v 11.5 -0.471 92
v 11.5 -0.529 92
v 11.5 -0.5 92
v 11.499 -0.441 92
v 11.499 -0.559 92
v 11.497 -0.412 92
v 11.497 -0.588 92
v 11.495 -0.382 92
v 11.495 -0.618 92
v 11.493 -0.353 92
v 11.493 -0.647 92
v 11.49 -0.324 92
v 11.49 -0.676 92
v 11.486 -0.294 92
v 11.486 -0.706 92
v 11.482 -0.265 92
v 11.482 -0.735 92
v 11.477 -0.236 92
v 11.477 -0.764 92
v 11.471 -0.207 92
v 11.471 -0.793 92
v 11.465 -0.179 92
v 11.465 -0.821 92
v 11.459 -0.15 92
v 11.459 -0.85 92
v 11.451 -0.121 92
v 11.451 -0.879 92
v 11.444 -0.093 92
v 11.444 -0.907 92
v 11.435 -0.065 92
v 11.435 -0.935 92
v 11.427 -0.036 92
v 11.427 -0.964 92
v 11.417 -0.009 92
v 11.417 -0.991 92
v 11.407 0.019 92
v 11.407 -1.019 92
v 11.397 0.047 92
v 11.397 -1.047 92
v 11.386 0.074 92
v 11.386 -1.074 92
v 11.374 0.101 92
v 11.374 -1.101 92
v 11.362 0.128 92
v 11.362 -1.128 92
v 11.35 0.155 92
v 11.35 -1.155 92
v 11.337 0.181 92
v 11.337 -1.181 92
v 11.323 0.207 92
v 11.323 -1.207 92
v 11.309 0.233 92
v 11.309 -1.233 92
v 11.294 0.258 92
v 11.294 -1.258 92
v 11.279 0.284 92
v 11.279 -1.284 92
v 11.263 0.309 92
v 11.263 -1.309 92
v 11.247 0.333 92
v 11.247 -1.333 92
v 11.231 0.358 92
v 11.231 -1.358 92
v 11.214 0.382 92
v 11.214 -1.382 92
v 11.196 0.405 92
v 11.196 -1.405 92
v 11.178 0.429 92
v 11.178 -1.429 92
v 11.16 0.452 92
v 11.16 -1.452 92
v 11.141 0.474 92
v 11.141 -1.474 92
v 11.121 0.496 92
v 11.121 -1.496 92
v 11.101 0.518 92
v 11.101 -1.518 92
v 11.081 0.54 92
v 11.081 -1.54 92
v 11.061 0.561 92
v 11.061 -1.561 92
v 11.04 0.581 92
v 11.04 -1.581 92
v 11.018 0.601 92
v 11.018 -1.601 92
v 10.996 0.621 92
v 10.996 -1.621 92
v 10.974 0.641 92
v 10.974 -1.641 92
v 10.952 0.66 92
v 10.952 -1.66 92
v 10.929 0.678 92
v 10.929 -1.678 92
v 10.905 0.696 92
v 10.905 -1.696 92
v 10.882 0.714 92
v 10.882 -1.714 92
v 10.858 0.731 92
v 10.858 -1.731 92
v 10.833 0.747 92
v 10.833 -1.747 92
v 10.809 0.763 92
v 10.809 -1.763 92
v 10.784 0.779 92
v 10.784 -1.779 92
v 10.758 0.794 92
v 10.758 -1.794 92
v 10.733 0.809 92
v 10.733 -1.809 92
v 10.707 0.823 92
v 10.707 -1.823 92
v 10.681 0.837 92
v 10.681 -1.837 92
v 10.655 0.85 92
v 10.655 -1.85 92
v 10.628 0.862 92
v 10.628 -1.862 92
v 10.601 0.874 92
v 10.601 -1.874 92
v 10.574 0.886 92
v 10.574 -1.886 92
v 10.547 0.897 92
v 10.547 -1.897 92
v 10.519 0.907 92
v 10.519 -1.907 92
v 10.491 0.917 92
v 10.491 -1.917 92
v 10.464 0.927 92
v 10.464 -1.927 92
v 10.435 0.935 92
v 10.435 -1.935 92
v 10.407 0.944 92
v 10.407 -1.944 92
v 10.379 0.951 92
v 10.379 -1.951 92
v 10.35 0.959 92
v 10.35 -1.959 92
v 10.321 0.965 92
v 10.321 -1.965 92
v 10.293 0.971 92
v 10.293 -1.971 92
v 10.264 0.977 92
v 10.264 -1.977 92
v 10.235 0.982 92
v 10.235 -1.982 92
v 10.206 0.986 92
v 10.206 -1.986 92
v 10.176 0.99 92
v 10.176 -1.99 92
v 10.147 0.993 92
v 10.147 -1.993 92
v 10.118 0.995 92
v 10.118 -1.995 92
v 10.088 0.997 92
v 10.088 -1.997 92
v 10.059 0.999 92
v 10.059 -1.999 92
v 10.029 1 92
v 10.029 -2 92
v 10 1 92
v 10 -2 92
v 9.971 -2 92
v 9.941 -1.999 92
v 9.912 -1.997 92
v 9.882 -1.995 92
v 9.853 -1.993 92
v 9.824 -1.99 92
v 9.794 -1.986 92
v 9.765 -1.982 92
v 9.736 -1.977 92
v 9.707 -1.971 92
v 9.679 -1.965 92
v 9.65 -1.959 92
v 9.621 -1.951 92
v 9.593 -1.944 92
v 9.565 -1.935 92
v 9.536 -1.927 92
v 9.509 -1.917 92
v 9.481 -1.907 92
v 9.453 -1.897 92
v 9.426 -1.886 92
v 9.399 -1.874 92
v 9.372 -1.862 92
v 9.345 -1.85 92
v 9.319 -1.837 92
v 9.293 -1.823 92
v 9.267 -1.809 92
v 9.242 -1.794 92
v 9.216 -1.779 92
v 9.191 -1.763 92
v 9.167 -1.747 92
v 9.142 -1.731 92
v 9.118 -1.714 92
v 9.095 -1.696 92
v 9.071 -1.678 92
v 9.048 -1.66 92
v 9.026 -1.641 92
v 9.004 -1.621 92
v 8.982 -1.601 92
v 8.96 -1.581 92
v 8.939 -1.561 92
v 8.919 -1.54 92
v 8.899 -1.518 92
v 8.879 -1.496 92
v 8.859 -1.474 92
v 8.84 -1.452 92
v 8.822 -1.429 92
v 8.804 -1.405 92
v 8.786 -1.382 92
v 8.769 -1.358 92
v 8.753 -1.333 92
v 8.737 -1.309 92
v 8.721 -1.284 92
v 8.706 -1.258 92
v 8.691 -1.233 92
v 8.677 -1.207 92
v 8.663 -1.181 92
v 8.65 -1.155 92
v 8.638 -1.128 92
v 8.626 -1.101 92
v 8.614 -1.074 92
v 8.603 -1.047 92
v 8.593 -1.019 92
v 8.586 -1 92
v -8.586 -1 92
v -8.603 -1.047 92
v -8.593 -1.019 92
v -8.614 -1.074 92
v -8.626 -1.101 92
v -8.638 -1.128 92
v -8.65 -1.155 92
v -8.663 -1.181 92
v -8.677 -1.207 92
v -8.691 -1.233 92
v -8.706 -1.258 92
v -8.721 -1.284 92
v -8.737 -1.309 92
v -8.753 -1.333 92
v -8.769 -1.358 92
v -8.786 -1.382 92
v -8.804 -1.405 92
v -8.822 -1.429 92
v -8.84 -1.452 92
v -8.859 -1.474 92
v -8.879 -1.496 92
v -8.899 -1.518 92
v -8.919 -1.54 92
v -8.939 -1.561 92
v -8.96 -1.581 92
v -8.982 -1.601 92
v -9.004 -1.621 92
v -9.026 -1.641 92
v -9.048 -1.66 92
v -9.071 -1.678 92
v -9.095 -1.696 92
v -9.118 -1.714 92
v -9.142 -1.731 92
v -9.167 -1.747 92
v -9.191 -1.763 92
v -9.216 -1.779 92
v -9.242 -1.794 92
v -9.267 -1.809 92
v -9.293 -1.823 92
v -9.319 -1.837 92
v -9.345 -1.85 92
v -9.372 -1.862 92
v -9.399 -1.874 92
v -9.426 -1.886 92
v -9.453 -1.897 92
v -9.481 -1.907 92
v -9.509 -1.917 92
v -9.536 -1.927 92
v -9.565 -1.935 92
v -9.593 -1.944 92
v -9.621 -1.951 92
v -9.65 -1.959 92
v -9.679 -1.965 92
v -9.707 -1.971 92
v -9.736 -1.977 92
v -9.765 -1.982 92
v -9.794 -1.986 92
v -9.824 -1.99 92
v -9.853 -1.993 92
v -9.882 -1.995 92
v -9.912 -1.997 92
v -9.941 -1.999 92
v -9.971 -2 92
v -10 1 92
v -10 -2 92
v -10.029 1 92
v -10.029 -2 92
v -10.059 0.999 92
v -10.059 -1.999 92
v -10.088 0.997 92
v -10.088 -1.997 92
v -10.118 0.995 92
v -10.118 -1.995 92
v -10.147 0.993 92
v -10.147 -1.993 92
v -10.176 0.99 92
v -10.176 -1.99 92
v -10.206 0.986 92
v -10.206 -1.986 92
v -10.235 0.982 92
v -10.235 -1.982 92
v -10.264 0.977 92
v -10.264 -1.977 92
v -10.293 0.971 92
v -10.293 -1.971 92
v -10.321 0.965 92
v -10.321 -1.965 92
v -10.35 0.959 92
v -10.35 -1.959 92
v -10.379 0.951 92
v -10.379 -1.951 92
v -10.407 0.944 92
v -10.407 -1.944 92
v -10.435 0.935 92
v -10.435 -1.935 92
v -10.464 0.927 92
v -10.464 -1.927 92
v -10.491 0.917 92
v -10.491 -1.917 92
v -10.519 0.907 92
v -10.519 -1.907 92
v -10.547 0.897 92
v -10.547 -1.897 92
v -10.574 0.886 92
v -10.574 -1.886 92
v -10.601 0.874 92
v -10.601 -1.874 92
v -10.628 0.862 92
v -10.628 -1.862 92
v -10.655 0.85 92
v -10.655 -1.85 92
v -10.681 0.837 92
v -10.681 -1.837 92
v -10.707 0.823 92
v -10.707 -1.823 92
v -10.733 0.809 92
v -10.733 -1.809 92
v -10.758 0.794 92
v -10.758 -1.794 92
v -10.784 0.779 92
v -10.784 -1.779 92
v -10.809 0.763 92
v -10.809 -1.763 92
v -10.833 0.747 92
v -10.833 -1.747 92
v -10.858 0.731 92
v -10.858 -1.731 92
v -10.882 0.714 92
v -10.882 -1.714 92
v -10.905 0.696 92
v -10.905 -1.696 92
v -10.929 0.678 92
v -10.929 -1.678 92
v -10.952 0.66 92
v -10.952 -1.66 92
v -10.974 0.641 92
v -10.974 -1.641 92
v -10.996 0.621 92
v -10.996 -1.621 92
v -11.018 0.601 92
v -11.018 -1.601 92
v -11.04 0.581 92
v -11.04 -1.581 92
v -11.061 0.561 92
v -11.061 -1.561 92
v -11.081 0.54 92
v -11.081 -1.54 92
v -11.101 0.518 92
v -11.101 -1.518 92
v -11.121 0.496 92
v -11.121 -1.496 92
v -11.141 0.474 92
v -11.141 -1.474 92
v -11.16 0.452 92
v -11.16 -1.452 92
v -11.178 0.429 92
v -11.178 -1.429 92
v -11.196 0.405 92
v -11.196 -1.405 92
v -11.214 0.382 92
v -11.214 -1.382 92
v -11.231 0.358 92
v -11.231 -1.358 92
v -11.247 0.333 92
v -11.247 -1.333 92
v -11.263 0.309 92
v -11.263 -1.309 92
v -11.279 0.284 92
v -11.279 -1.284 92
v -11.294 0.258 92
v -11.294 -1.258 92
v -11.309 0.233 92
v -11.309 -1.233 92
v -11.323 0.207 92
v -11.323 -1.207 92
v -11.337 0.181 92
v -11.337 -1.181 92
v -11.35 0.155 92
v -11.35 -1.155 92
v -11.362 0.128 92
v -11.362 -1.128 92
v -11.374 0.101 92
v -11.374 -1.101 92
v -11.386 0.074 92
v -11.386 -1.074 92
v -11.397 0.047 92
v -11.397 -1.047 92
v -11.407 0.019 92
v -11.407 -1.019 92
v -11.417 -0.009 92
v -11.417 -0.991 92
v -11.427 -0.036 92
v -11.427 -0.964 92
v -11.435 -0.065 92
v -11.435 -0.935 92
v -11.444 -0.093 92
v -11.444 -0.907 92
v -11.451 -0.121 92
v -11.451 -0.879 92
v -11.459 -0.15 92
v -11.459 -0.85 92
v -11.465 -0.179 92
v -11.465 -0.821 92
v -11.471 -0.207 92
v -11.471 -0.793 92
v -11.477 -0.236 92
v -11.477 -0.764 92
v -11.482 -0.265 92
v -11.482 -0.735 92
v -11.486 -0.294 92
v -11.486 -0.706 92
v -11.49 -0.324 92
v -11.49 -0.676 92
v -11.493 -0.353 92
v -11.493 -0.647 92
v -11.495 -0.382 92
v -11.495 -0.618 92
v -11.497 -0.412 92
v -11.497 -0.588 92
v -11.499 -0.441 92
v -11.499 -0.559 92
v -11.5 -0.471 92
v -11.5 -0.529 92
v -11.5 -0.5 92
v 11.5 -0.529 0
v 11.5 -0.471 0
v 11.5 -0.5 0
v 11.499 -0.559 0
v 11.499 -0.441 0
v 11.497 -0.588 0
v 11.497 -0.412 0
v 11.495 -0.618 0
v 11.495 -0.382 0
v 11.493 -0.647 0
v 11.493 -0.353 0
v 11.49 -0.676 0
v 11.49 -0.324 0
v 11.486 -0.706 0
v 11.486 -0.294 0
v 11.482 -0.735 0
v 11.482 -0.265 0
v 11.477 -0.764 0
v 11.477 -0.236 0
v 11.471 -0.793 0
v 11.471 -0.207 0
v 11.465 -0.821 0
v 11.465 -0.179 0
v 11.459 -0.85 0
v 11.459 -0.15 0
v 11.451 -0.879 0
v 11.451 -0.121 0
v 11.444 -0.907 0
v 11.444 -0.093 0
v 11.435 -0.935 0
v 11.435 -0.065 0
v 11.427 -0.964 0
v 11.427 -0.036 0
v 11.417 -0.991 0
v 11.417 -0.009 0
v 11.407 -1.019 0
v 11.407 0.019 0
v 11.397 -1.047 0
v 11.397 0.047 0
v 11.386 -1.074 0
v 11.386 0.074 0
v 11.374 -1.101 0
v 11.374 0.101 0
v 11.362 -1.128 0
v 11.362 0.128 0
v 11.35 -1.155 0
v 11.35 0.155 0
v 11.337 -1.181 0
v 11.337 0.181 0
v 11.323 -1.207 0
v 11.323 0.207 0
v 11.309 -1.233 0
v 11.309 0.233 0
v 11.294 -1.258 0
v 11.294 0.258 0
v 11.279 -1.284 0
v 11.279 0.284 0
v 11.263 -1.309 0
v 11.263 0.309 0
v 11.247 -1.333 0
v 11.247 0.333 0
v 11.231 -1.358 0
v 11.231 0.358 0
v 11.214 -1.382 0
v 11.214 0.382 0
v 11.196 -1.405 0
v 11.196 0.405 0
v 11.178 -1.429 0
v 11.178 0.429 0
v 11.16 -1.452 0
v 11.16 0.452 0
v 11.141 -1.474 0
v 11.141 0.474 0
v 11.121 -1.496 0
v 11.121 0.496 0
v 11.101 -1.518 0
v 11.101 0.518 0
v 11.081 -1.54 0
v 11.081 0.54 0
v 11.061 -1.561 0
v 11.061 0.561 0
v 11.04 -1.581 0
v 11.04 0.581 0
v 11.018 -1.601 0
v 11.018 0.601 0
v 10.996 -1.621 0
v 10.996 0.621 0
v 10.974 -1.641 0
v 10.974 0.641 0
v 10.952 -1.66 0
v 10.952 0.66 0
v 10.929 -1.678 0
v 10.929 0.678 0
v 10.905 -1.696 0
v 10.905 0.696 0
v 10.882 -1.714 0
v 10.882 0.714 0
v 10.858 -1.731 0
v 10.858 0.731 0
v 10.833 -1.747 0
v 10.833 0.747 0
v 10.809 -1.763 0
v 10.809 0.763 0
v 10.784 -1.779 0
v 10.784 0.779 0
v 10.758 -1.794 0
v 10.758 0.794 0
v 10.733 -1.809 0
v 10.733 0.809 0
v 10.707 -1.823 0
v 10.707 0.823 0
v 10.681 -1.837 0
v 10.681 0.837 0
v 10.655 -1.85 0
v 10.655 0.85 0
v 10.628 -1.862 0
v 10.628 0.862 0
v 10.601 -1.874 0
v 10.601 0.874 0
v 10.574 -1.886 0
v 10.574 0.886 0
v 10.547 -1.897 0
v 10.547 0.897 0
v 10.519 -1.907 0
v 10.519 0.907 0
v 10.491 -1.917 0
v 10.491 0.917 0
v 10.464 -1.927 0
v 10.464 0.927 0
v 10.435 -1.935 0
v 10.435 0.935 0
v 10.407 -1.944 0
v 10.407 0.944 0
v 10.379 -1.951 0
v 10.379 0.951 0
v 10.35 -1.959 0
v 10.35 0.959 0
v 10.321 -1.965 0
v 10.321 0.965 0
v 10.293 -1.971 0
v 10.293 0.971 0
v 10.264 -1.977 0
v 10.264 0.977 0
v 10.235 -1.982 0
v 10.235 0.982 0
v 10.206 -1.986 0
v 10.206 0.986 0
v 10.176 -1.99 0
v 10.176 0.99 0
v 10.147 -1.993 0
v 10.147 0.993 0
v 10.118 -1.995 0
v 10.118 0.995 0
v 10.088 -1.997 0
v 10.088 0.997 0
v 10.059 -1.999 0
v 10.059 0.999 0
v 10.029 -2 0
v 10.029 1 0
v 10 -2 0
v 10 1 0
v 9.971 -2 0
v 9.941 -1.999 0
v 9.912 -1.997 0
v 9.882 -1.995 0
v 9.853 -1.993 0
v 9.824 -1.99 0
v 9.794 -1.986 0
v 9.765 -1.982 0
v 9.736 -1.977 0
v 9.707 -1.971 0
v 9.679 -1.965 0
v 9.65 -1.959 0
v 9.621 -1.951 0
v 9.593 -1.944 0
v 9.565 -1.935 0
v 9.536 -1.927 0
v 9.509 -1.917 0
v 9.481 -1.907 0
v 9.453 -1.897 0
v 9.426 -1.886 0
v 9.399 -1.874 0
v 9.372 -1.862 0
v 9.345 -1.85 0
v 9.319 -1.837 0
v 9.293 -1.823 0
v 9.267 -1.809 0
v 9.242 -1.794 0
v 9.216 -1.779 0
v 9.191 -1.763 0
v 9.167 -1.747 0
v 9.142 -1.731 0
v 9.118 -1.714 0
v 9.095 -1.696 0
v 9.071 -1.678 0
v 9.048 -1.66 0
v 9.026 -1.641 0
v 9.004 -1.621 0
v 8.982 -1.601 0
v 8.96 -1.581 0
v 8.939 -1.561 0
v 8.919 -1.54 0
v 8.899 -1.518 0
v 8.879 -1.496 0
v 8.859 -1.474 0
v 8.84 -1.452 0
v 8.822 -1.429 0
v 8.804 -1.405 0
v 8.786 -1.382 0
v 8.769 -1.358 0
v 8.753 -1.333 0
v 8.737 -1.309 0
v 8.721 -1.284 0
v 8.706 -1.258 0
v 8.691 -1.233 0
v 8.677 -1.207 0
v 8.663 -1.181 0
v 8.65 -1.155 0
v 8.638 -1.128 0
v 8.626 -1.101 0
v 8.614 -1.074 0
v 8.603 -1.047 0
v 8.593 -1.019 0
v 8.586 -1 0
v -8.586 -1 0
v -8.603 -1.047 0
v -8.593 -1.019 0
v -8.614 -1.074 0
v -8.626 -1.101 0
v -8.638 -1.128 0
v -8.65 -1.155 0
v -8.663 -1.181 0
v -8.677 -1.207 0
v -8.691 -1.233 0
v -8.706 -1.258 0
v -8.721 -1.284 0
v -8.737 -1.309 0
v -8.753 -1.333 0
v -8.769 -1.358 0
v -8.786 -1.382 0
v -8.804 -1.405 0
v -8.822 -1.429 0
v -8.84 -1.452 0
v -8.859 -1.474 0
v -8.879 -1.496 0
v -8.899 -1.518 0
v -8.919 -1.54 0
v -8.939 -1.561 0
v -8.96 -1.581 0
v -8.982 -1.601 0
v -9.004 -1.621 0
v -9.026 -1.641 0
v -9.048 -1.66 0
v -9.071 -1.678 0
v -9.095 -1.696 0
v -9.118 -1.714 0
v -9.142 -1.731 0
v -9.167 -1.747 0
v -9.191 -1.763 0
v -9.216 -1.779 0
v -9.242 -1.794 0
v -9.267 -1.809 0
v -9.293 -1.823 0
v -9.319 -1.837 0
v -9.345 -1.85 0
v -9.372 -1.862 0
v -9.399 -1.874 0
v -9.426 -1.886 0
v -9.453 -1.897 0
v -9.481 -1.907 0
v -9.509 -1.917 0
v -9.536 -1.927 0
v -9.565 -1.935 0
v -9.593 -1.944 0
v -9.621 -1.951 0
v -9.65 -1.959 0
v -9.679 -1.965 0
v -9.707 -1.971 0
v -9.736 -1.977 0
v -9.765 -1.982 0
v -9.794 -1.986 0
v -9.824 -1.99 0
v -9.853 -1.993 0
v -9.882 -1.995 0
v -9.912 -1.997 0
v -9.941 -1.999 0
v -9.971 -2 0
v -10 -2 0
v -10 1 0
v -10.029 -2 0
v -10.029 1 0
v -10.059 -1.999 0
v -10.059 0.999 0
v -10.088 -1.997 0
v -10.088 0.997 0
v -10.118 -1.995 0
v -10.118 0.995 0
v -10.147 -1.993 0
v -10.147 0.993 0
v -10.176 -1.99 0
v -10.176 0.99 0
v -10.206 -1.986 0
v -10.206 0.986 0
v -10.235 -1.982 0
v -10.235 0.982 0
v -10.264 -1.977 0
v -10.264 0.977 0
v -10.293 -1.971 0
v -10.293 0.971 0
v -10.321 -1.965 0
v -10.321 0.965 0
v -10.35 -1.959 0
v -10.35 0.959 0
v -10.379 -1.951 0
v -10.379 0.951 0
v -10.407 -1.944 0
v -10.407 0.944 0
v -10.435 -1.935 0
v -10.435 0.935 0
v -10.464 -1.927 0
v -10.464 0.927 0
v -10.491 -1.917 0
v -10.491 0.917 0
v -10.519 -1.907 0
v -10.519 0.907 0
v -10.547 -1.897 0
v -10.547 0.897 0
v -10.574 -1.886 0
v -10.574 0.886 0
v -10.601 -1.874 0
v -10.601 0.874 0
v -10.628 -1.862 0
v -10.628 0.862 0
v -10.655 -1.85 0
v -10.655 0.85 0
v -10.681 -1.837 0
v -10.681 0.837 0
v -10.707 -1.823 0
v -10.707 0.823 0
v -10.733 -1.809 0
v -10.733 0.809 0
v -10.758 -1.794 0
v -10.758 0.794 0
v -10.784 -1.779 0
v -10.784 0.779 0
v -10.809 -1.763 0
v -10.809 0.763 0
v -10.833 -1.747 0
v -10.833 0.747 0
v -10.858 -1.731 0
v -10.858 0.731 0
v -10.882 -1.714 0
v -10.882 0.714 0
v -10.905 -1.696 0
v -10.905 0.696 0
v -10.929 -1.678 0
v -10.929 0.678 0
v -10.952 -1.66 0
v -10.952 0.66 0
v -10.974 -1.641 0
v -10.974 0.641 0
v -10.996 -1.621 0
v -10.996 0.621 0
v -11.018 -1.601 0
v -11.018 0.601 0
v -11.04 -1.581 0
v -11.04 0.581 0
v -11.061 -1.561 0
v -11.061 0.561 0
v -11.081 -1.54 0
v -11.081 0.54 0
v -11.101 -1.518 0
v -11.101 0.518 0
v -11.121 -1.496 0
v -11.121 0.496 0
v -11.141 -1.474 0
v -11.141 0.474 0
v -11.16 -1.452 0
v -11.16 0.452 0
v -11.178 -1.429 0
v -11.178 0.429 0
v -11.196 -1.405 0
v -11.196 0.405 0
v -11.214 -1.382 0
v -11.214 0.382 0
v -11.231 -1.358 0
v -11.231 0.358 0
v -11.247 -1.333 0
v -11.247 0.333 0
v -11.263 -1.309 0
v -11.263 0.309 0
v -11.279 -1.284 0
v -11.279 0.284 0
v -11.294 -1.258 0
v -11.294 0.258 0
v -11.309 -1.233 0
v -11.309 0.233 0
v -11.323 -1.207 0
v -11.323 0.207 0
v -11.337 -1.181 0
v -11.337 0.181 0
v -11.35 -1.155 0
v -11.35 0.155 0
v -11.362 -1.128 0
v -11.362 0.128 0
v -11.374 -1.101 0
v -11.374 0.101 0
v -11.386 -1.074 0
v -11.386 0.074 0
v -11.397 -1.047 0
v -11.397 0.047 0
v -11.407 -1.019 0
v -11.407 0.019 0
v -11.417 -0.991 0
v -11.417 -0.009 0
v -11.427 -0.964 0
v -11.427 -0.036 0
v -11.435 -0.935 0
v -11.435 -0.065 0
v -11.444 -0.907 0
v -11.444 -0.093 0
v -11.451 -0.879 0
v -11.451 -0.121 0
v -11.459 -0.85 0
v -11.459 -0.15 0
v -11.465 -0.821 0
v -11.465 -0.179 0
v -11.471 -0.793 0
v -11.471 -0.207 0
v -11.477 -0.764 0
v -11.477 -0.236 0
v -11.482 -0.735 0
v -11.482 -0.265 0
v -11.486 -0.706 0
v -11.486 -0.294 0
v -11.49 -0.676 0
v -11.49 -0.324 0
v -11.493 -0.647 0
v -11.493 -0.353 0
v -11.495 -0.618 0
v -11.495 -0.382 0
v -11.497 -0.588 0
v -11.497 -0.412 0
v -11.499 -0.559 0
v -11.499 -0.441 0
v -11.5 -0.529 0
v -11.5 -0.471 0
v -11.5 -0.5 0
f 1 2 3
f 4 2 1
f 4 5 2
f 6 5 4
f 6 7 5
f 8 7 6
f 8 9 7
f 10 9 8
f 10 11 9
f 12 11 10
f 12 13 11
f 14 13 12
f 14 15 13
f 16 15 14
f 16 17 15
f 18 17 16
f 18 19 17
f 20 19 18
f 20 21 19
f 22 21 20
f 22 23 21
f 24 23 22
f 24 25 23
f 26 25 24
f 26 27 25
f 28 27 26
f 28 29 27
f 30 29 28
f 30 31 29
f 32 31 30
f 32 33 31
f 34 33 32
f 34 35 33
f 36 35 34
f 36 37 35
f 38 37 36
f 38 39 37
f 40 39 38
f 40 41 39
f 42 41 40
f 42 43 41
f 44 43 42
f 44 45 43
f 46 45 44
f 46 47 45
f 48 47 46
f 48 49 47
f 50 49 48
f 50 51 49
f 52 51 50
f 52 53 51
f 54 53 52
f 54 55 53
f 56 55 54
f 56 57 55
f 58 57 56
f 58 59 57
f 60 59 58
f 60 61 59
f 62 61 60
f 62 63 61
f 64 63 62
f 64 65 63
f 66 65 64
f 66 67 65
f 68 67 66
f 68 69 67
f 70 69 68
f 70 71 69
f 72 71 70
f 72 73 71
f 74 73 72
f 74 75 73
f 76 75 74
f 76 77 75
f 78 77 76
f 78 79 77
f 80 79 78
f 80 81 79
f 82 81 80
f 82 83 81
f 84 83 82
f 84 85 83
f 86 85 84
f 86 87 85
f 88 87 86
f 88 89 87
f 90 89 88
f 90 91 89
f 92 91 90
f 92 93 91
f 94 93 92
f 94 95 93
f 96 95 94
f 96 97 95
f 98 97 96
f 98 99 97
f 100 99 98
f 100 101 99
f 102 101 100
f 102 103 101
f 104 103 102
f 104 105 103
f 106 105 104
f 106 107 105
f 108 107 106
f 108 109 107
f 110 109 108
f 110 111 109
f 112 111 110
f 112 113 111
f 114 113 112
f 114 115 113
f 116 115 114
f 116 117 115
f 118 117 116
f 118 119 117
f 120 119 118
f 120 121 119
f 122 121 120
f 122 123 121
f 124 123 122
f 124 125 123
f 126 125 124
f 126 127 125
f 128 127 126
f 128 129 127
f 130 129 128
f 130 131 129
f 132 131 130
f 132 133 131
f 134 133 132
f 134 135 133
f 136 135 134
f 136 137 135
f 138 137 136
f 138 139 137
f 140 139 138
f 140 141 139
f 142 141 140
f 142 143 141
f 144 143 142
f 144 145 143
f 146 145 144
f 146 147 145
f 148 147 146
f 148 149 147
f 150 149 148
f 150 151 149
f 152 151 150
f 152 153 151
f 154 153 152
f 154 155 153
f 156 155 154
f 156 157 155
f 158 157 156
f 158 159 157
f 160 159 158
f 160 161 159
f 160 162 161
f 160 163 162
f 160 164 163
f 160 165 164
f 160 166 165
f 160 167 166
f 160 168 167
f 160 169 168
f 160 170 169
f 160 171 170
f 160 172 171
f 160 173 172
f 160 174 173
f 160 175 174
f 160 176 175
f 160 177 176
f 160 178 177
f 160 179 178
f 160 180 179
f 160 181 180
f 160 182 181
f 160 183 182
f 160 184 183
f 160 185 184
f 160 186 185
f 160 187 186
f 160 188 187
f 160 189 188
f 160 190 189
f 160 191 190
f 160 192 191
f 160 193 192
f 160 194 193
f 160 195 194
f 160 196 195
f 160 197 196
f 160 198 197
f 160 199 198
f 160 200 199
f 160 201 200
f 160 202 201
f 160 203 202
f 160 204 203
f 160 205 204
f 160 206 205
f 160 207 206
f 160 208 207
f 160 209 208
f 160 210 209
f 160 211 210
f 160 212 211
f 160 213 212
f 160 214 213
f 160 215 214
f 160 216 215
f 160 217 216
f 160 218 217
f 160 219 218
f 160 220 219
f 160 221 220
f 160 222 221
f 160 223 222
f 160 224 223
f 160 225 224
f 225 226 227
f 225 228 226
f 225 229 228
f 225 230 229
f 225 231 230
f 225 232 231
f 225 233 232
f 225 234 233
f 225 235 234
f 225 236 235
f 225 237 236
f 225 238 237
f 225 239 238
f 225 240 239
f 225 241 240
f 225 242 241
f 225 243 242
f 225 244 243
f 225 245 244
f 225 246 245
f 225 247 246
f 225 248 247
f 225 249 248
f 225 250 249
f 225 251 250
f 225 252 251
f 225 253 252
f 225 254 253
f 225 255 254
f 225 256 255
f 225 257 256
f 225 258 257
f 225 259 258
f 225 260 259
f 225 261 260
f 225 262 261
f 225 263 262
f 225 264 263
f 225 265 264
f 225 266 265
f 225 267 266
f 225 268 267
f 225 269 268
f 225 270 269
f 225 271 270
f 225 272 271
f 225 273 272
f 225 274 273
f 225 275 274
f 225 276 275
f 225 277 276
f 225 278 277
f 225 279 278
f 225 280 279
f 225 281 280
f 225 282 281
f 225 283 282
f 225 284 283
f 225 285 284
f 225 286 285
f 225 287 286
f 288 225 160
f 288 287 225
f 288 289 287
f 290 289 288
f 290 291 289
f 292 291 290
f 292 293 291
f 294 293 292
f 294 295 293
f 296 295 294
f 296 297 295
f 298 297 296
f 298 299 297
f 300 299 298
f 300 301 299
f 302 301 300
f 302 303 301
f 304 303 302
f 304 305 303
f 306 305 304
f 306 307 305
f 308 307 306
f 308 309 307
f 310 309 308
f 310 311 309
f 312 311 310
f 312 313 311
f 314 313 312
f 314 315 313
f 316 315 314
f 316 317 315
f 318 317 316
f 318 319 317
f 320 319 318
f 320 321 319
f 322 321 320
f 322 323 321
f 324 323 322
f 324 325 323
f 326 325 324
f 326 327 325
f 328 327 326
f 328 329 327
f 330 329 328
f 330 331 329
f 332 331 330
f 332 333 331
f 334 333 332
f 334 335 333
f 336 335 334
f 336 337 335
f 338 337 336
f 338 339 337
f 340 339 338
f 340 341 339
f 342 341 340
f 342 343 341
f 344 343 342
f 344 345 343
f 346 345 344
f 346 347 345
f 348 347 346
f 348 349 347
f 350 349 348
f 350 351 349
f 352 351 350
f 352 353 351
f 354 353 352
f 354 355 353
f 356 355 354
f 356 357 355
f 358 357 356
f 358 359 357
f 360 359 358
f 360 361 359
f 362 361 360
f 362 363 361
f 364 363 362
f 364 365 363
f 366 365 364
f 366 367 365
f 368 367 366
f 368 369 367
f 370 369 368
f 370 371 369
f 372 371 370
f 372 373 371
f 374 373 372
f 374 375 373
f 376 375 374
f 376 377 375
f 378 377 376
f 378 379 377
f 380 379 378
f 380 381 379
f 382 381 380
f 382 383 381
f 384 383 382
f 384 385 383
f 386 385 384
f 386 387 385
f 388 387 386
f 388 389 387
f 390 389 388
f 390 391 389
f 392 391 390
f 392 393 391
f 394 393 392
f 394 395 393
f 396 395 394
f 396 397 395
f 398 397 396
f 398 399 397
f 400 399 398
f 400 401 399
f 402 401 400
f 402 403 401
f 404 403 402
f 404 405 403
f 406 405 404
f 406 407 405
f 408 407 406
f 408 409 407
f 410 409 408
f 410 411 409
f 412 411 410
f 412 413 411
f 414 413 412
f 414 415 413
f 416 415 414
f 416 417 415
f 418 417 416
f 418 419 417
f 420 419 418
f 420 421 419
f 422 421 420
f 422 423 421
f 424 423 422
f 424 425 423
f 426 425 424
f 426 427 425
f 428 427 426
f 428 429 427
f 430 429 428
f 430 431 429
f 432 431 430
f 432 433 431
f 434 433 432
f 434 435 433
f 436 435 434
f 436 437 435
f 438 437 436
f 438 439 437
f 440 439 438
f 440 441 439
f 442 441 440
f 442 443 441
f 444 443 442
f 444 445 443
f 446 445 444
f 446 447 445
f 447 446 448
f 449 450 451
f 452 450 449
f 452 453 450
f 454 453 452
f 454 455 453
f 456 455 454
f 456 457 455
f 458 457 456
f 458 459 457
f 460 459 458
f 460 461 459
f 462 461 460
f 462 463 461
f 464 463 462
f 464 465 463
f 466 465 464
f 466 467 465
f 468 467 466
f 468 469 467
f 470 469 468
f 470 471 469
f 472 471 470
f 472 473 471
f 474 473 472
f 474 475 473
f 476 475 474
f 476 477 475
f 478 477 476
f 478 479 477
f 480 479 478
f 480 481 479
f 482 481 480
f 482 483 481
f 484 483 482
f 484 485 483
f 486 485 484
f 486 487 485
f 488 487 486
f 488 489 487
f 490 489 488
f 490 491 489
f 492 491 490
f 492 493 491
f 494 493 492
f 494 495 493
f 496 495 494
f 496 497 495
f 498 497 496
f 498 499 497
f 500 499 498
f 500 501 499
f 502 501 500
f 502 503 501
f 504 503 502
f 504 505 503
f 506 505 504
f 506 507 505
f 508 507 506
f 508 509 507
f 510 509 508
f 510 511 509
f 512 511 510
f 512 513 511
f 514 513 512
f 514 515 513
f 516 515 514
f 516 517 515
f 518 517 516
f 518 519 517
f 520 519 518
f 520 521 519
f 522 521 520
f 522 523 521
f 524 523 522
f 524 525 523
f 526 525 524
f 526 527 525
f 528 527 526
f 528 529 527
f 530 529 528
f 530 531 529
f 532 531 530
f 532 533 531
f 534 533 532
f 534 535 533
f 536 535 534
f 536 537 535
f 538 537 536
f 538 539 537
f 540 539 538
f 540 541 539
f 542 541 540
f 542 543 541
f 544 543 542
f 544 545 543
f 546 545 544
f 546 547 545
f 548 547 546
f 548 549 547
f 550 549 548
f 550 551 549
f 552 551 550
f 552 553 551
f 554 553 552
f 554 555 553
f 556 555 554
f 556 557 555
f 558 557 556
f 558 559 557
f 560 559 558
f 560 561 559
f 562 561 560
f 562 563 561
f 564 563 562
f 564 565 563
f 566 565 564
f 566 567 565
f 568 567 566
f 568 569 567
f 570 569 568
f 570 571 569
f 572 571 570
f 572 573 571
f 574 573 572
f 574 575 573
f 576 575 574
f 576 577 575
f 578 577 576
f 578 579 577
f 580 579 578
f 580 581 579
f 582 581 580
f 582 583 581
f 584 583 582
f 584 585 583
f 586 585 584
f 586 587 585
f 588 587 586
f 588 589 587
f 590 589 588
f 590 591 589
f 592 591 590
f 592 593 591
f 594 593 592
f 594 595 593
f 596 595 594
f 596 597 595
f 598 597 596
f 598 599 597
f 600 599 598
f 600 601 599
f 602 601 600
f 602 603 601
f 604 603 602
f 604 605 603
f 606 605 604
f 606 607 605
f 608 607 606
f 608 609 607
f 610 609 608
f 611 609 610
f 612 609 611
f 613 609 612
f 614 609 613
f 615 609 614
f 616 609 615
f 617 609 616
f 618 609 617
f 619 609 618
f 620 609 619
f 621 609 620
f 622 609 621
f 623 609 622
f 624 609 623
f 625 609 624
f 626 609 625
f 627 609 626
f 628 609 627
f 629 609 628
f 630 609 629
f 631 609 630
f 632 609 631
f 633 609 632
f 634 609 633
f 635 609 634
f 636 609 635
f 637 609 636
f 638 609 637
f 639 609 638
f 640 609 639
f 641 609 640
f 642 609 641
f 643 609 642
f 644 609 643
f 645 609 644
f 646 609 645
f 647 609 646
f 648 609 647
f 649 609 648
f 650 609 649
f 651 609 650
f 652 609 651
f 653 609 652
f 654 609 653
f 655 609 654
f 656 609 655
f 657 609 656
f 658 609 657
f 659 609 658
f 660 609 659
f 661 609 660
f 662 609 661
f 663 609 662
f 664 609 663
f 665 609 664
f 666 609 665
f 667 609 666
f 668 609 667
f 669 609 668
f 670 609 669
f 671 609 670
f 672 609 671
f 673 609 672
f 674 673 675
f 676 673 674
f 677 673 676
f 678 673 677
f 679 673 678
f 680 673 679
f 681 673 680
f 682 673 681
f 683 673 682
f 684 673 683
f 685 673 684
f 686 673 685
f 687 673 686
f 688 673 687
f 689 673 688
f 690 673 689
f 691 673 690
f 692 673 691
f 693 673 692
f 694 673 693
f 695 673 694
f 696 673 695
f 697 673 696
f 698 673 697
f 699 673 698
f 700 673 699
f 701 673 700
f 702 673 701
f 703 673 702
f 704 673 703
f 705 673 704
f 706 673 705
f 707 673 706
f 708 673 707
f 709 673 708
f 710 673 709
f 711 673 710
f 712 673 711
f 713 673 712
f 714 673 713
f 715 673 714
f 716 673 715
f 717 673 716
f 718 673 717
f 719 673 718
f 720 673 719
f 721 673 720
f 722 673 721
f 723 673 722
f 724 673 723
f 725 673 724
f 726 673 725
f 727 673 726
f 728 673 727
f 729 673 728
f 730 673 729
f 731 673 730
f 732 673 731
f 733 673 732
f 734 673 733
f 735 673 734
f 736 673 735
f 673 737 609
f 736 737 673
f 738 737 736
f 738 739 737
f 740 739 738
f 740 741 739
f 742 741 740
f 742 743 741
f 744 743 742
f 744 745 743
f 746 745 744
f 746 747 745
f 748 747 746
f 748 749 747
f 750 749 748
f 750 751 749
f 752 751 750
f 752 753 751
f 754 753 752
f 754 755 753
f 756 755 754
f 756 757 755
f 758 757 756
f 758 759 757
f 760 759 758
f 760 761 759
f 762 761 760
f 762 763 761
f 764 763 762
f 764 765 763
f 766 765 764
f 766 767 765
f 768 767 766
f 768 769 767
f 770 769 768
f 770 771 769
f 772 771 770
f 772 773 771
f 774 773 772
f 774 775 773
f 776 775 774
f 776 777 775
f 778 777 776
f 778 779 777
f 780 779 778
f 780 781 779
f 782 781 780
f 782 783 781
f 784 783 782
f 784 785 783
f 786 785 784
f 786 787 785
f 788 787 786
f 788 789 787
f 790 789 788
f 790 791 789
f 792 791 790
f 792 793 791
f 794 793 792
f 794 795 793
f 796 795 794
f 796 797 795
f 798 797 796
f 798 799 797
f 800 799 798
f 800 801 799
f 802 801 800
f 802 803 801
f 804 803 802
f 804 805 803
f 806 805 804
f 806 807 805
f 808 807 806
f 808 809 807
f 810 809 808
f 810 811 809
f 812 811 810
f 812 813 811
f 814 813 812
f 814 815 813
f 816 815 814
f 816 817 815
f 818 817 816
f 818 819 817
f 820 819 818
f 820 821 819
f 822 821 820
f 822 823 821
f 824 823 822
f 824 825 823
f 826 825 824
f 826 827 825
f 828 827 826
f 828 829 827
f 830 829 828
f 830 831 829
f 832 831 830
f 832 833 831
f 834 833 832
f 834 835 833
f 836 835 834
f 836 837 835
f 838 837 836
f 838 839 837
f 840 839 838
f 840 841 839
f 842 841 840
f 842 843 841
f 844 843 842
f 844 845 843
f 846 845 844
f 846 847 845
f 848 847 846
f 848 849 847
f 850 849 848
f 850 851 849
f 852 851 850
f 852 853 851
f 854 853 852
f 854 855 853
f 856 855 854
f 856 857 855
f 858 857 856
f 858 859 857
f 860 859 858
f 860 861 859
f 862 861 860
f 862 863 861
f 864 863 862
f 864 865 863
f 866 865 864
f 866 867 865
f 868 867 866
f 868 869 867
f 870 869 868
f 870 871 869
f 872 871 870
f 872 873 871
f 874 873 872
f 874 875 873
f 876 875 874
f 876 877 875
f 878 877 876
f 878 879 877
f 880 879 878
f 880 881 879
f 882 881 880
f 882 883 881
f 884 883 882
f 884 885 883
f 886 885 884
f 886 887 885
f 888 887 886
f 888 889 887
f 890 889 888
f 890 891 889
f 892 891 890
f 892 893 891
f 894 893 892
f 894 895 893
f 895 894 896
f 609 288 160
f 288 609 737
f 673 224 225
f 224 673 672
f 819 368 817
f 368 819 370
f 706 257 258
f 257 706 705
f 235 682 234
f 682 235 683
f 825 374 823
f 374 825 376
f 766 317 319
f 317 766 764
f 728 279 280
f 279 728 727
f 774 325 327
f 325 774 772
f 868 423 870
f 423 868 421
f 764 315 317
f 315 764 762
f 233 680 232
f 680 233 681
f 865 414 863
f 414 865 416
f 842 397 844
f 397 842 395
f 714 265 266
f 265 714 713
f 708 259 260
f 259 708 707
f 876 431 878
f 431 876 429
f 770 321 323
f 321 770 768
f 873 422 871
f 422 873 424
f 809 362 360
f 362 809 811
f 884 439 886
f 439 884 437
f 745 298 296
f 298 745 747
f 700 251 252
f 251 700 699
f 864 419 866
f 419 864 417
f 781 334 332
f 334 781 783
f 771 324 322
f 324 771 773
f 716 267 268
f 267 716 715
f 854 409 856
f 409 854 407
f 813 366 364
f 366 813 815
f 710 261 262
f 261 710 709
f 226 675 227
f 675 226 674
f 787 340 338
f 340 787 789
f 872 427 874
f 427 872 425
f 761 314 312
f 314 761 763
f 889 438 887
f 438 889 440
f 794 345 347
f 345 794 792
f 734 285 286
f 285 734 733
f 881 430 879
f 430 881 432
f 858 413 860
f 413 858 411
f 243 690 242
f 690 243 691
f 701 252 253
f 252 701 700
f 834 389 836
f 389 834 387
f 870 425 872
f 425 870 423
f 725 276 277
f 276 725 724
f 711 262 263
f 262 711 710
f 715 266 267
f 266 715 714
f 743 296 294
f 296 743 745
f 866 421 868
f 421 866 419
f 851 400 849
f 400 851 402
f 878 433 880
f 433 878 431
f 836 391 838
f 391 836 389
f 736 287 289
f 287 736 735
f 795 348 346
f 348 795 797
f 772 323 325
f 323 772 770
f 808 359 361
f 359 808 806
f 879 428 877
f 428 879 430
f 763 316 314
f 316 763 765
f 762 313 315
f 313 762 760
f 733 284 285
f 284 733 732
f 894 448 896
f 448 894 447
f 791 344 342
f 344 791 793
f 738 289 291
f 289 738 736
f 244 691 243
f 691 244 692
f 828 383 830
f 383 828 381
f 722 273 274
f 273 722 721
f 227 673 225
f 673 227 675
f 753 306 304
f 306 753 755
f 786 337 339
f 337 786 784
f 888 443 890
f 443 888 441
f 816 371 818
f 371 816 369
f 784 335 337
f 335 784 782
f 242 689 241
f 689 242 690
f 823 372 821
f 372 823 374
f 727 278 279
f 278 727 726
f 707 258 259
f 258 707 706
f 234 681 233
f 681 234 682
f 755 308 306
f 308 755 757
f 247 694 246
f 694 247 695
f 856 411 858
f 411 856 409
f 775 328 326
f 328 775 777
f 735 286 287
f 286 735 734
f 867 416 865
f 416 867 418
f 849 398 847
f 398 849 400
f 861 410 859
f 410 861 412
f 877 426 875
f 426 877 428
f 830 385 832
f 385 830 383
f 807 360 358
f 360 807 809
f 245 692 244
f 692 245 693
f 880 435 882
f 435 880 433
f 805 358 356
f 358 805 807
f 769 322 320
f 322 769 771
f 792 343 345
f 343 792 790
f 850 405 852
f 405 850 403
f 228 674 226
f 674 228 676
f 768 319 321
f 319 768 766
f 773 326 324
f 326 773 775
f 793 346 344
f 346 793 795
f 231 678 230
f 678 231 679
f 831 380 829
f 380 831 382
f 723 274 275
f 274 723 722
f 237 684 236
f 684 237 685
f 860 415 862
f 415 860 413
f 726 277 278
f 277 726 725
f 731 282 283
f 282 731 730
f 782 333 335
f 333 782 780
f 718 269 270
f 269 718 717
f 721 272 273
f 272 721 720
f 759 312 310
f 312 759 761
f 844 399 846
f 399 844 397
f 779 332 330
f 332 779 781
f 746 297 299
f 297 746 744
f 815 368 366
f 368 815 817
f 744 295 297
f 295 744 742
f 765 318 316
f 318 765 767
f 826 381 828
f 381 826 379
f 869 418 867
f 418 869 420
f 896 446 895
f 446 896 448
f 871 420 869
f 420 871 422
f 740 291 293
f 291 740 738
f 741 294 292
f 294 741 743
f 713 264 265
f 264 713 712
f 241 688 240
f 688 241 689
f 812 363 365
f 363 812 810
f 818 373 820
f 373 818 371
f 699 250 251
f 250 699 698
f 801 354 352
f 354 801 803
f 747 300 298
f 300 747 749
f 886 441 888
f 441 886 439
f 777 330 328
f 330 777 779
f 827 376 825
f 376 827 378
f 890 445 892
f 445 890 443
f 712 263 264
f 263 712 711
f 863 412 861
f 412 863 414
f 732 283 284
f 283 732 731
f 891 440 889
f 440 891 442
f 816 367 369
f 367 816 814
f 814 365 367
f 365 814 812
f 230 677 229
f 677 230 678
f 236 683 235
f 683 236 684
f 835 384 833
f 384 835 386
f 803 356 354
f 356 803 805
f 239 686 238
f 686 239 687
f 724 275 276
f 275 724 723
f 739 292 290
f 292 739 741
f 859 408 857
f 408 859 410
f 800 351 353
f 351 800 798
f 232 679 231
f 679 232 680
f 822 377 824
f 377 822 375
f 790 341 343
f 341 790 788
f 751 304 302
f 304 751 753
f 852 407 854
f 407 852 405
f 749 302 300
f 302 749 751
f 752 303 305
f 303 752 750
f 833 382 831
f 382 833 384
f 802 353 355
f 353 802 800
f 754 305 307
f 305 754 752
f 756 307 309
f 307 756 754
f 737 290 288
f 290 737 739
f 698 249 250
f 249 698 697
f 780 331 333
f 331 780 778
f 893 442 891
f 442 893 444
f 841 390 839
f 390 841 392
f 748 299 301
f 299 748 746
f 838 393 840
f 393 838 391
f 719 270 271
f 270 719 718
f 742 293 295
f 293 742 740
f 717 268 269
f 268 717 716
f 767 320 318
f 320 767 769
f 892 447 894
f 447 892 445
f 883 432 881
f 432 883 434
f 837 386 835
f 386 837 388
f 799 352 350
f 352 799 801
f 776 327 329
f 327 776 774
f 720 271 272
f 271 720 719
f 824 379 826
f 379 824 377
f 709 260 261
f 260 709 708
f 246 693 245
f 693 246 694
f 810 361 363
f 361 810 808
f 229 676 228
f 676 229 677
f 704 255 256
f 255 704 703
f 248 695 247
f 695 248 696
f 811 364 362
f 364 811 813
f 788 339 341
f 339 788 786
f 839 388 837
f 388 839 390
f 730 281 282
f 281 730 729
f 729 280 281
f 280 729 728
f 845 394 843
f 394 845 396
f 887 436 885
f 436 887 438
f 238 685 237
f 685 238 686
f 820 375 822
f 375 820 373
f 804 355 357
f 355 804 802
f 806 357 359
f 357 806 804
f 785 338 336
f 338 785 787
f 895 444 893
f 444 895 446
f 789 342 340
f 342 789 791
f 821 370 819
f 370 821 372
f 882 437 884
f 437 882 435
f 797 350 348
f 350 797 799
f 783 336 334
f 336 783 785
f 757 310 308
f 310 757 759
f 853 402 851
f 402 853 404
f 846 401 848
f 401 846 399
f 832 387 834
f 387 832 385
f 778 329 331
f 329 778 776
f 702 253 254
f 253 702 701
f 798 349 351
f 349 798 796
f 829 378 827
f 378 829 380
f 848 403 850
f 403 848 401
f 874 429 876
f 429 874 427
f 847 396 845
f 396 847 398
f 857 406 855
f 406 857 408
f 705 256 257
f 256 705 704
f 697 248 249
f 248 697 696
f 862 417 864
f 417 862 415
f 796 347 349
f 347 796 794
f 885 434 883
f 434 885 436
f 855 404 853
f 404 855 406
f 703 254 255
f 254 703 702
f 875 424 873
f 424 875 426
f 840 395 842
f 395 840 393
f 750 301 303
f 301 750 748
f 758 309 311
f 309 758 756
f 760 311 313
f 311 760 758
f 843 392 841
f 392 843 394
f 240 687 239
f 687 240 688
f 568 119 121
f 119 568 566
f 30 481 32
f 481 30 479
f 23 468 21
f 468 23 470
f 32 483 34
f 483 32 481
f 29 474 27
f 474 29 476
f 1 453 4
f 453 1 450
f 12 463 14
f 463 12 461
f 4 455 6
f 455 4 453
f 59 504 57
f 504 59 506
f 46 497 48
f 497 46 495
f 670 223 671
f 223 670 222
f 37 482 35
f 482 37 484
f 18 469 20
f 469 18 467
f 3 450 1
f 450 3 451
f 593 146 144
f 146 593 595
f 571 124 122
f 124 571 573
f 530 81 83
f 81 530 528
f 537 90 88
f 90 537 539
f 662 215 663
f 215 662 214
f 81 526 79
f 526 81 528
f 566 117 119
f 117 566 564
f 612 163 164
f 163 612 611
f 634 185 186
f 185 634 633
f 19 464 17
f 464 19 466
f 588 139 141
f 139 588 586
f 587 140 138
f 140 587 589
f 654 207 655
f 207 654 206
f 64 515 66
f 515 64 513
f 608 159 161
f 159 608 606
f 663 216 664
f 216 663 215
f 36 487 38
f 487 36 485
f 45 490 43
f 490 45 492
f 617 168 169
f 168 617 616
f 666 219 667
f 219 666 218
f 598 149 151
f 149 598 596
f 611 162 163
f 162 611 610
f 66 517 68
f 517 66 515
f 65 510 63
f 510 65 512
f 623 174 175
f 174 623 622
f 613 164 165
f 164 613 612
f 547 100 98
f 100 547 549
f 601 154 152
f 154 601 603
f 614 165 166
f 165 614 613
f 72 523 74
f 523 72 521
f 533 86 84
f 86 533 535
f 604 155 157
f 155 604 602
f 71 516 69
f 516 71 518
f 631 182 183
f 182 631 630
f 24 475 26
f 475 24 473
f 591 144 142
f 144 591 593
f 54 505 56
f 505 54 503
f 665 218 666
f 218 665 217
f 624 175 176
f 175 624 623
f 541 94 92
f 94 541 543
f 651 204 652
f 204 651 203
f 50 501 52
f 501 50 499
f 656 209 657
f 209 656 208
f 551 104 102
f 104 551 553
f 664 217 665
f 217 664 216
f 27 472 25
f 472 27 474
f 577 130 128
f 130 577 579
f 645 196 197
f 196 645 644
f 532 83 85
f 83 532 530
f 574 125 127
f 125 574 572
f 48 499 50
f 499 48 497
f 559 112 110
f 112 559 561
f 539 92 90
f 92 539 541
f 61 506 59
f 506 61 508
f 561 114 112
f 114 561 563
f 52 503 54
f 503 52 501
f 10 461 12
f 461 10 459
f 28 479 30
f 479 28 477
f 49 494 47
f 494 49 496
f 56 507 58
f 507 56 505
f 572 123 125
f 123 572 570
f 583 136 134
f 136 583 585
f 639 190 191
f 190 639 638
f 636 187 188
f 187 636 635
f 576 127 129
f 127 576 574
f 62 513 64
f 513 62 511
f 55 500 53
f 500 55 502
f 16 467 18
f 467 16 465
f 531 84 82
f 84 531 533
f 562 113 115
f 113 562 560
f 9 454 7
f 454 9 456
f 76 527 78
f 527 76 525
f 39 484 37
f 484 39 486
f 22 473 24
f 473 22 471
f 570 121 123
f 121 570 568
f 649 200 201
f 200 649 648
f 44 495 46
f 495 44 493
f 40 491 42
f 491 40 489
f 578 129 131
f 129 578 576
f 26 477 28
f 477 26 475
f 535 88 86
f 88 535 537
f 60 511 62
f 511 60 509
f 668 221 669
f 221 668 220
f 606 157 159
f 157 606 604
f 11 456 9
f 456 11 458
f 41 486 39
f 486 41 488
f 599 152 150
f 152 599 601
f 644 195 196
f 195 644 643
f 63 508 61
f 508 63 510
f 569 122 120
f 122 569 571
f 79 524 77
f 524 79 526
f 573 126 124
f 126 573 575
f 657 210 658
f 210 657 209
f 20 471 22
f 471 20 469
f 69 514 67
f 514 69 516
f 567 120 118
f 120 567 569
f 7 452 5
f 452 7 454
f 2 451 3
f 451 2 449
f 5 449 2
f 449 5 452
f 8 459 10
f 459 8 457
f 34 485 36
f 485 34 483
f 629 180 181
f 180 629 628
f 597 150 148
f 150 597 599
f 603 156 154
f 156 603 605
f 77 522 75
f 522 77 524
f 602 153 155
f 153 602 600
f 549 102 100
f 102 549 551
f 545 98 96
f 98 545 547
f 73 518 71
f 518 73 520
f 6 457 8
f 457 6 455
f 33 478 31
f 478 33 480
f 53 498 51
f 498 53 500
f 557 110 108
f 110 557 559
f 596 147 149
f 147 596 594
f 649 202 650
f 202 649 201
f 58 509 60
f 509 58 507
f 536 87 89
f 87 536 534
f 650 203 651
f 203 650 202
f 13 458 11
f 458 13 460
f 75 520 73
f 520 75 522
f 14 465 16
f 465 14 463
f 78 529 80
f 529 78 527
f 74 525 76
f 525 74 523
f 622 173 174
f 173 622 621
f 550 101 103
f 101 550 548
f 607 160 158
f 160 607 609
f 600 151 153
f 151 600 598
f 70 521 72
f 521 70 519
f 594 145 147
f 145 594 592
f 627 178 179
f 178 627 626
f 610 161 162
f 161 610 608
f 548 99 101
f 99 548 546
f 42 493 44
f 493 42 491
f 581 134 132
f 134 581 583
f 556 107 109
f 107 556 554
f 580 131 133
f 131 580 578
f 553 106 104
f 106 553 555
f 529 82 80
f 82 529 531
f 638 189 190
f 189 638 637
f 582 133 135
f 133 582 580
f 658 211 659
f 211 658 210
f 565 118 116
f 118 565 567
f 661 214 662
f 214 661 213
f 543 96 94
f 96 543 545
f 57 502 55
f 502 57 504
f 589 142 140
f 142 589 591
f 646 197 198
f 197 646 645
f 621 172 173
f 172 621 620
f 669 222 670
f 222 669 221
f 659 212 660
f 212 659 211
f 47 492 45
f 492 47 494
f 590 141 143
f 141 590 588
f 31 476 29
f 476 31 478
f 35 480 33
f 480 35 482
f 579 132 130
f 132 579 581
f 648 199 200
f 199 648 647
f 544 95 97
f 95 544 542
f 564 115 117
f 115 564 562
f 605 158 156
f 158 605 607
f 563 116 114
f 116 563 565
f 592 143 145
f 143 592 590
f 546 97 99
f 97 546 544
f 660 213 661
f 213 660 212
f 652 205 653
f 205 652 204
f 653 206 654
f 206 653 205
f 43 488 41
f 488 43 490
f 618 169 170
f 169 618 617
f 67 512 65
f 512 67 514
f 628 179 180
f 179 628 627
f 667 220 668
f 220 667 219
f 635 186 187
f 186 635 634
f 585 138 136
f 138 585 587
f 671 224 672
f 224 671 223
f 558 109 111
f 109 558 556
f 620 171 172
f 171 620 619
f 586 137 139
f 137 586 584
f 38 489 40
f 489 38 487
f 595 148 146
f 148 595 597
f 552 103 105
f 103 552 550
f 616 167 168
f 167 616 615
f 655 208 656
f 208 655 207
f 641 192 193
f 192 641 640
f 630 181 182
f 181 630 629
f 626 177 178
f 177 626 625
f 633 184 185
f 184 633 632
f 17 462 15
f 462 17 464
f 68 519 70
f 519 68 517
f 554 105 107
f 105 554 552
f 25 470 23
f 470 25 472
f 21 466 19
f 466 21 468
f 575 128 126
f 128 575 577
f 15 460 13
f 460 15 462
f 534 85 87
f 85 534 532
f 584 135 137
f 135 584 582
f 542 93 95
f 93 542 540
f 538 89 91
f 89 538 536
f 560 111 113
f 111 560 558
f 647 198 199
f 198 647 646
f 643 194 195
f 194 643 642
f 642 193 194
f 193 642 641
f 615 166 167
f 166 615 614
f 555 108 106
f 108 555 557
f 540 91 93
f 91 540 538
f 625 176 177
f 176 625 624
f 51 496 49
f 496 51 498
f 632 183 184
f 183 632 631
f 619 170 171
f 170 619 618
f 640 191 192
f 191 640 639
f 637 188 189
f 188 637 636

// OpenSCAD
$fn=320;
union(){translate(v = [-10.000, -1.000])
cube(size = [20.000, 2, 92.000]);
translate(v = [-10.000, -0.500])
cylinder(h = 92.000, r = 1.500);
translate(v = [10.000, -0.500])
cylinder(h = 92.000, r = 1.500);
}
